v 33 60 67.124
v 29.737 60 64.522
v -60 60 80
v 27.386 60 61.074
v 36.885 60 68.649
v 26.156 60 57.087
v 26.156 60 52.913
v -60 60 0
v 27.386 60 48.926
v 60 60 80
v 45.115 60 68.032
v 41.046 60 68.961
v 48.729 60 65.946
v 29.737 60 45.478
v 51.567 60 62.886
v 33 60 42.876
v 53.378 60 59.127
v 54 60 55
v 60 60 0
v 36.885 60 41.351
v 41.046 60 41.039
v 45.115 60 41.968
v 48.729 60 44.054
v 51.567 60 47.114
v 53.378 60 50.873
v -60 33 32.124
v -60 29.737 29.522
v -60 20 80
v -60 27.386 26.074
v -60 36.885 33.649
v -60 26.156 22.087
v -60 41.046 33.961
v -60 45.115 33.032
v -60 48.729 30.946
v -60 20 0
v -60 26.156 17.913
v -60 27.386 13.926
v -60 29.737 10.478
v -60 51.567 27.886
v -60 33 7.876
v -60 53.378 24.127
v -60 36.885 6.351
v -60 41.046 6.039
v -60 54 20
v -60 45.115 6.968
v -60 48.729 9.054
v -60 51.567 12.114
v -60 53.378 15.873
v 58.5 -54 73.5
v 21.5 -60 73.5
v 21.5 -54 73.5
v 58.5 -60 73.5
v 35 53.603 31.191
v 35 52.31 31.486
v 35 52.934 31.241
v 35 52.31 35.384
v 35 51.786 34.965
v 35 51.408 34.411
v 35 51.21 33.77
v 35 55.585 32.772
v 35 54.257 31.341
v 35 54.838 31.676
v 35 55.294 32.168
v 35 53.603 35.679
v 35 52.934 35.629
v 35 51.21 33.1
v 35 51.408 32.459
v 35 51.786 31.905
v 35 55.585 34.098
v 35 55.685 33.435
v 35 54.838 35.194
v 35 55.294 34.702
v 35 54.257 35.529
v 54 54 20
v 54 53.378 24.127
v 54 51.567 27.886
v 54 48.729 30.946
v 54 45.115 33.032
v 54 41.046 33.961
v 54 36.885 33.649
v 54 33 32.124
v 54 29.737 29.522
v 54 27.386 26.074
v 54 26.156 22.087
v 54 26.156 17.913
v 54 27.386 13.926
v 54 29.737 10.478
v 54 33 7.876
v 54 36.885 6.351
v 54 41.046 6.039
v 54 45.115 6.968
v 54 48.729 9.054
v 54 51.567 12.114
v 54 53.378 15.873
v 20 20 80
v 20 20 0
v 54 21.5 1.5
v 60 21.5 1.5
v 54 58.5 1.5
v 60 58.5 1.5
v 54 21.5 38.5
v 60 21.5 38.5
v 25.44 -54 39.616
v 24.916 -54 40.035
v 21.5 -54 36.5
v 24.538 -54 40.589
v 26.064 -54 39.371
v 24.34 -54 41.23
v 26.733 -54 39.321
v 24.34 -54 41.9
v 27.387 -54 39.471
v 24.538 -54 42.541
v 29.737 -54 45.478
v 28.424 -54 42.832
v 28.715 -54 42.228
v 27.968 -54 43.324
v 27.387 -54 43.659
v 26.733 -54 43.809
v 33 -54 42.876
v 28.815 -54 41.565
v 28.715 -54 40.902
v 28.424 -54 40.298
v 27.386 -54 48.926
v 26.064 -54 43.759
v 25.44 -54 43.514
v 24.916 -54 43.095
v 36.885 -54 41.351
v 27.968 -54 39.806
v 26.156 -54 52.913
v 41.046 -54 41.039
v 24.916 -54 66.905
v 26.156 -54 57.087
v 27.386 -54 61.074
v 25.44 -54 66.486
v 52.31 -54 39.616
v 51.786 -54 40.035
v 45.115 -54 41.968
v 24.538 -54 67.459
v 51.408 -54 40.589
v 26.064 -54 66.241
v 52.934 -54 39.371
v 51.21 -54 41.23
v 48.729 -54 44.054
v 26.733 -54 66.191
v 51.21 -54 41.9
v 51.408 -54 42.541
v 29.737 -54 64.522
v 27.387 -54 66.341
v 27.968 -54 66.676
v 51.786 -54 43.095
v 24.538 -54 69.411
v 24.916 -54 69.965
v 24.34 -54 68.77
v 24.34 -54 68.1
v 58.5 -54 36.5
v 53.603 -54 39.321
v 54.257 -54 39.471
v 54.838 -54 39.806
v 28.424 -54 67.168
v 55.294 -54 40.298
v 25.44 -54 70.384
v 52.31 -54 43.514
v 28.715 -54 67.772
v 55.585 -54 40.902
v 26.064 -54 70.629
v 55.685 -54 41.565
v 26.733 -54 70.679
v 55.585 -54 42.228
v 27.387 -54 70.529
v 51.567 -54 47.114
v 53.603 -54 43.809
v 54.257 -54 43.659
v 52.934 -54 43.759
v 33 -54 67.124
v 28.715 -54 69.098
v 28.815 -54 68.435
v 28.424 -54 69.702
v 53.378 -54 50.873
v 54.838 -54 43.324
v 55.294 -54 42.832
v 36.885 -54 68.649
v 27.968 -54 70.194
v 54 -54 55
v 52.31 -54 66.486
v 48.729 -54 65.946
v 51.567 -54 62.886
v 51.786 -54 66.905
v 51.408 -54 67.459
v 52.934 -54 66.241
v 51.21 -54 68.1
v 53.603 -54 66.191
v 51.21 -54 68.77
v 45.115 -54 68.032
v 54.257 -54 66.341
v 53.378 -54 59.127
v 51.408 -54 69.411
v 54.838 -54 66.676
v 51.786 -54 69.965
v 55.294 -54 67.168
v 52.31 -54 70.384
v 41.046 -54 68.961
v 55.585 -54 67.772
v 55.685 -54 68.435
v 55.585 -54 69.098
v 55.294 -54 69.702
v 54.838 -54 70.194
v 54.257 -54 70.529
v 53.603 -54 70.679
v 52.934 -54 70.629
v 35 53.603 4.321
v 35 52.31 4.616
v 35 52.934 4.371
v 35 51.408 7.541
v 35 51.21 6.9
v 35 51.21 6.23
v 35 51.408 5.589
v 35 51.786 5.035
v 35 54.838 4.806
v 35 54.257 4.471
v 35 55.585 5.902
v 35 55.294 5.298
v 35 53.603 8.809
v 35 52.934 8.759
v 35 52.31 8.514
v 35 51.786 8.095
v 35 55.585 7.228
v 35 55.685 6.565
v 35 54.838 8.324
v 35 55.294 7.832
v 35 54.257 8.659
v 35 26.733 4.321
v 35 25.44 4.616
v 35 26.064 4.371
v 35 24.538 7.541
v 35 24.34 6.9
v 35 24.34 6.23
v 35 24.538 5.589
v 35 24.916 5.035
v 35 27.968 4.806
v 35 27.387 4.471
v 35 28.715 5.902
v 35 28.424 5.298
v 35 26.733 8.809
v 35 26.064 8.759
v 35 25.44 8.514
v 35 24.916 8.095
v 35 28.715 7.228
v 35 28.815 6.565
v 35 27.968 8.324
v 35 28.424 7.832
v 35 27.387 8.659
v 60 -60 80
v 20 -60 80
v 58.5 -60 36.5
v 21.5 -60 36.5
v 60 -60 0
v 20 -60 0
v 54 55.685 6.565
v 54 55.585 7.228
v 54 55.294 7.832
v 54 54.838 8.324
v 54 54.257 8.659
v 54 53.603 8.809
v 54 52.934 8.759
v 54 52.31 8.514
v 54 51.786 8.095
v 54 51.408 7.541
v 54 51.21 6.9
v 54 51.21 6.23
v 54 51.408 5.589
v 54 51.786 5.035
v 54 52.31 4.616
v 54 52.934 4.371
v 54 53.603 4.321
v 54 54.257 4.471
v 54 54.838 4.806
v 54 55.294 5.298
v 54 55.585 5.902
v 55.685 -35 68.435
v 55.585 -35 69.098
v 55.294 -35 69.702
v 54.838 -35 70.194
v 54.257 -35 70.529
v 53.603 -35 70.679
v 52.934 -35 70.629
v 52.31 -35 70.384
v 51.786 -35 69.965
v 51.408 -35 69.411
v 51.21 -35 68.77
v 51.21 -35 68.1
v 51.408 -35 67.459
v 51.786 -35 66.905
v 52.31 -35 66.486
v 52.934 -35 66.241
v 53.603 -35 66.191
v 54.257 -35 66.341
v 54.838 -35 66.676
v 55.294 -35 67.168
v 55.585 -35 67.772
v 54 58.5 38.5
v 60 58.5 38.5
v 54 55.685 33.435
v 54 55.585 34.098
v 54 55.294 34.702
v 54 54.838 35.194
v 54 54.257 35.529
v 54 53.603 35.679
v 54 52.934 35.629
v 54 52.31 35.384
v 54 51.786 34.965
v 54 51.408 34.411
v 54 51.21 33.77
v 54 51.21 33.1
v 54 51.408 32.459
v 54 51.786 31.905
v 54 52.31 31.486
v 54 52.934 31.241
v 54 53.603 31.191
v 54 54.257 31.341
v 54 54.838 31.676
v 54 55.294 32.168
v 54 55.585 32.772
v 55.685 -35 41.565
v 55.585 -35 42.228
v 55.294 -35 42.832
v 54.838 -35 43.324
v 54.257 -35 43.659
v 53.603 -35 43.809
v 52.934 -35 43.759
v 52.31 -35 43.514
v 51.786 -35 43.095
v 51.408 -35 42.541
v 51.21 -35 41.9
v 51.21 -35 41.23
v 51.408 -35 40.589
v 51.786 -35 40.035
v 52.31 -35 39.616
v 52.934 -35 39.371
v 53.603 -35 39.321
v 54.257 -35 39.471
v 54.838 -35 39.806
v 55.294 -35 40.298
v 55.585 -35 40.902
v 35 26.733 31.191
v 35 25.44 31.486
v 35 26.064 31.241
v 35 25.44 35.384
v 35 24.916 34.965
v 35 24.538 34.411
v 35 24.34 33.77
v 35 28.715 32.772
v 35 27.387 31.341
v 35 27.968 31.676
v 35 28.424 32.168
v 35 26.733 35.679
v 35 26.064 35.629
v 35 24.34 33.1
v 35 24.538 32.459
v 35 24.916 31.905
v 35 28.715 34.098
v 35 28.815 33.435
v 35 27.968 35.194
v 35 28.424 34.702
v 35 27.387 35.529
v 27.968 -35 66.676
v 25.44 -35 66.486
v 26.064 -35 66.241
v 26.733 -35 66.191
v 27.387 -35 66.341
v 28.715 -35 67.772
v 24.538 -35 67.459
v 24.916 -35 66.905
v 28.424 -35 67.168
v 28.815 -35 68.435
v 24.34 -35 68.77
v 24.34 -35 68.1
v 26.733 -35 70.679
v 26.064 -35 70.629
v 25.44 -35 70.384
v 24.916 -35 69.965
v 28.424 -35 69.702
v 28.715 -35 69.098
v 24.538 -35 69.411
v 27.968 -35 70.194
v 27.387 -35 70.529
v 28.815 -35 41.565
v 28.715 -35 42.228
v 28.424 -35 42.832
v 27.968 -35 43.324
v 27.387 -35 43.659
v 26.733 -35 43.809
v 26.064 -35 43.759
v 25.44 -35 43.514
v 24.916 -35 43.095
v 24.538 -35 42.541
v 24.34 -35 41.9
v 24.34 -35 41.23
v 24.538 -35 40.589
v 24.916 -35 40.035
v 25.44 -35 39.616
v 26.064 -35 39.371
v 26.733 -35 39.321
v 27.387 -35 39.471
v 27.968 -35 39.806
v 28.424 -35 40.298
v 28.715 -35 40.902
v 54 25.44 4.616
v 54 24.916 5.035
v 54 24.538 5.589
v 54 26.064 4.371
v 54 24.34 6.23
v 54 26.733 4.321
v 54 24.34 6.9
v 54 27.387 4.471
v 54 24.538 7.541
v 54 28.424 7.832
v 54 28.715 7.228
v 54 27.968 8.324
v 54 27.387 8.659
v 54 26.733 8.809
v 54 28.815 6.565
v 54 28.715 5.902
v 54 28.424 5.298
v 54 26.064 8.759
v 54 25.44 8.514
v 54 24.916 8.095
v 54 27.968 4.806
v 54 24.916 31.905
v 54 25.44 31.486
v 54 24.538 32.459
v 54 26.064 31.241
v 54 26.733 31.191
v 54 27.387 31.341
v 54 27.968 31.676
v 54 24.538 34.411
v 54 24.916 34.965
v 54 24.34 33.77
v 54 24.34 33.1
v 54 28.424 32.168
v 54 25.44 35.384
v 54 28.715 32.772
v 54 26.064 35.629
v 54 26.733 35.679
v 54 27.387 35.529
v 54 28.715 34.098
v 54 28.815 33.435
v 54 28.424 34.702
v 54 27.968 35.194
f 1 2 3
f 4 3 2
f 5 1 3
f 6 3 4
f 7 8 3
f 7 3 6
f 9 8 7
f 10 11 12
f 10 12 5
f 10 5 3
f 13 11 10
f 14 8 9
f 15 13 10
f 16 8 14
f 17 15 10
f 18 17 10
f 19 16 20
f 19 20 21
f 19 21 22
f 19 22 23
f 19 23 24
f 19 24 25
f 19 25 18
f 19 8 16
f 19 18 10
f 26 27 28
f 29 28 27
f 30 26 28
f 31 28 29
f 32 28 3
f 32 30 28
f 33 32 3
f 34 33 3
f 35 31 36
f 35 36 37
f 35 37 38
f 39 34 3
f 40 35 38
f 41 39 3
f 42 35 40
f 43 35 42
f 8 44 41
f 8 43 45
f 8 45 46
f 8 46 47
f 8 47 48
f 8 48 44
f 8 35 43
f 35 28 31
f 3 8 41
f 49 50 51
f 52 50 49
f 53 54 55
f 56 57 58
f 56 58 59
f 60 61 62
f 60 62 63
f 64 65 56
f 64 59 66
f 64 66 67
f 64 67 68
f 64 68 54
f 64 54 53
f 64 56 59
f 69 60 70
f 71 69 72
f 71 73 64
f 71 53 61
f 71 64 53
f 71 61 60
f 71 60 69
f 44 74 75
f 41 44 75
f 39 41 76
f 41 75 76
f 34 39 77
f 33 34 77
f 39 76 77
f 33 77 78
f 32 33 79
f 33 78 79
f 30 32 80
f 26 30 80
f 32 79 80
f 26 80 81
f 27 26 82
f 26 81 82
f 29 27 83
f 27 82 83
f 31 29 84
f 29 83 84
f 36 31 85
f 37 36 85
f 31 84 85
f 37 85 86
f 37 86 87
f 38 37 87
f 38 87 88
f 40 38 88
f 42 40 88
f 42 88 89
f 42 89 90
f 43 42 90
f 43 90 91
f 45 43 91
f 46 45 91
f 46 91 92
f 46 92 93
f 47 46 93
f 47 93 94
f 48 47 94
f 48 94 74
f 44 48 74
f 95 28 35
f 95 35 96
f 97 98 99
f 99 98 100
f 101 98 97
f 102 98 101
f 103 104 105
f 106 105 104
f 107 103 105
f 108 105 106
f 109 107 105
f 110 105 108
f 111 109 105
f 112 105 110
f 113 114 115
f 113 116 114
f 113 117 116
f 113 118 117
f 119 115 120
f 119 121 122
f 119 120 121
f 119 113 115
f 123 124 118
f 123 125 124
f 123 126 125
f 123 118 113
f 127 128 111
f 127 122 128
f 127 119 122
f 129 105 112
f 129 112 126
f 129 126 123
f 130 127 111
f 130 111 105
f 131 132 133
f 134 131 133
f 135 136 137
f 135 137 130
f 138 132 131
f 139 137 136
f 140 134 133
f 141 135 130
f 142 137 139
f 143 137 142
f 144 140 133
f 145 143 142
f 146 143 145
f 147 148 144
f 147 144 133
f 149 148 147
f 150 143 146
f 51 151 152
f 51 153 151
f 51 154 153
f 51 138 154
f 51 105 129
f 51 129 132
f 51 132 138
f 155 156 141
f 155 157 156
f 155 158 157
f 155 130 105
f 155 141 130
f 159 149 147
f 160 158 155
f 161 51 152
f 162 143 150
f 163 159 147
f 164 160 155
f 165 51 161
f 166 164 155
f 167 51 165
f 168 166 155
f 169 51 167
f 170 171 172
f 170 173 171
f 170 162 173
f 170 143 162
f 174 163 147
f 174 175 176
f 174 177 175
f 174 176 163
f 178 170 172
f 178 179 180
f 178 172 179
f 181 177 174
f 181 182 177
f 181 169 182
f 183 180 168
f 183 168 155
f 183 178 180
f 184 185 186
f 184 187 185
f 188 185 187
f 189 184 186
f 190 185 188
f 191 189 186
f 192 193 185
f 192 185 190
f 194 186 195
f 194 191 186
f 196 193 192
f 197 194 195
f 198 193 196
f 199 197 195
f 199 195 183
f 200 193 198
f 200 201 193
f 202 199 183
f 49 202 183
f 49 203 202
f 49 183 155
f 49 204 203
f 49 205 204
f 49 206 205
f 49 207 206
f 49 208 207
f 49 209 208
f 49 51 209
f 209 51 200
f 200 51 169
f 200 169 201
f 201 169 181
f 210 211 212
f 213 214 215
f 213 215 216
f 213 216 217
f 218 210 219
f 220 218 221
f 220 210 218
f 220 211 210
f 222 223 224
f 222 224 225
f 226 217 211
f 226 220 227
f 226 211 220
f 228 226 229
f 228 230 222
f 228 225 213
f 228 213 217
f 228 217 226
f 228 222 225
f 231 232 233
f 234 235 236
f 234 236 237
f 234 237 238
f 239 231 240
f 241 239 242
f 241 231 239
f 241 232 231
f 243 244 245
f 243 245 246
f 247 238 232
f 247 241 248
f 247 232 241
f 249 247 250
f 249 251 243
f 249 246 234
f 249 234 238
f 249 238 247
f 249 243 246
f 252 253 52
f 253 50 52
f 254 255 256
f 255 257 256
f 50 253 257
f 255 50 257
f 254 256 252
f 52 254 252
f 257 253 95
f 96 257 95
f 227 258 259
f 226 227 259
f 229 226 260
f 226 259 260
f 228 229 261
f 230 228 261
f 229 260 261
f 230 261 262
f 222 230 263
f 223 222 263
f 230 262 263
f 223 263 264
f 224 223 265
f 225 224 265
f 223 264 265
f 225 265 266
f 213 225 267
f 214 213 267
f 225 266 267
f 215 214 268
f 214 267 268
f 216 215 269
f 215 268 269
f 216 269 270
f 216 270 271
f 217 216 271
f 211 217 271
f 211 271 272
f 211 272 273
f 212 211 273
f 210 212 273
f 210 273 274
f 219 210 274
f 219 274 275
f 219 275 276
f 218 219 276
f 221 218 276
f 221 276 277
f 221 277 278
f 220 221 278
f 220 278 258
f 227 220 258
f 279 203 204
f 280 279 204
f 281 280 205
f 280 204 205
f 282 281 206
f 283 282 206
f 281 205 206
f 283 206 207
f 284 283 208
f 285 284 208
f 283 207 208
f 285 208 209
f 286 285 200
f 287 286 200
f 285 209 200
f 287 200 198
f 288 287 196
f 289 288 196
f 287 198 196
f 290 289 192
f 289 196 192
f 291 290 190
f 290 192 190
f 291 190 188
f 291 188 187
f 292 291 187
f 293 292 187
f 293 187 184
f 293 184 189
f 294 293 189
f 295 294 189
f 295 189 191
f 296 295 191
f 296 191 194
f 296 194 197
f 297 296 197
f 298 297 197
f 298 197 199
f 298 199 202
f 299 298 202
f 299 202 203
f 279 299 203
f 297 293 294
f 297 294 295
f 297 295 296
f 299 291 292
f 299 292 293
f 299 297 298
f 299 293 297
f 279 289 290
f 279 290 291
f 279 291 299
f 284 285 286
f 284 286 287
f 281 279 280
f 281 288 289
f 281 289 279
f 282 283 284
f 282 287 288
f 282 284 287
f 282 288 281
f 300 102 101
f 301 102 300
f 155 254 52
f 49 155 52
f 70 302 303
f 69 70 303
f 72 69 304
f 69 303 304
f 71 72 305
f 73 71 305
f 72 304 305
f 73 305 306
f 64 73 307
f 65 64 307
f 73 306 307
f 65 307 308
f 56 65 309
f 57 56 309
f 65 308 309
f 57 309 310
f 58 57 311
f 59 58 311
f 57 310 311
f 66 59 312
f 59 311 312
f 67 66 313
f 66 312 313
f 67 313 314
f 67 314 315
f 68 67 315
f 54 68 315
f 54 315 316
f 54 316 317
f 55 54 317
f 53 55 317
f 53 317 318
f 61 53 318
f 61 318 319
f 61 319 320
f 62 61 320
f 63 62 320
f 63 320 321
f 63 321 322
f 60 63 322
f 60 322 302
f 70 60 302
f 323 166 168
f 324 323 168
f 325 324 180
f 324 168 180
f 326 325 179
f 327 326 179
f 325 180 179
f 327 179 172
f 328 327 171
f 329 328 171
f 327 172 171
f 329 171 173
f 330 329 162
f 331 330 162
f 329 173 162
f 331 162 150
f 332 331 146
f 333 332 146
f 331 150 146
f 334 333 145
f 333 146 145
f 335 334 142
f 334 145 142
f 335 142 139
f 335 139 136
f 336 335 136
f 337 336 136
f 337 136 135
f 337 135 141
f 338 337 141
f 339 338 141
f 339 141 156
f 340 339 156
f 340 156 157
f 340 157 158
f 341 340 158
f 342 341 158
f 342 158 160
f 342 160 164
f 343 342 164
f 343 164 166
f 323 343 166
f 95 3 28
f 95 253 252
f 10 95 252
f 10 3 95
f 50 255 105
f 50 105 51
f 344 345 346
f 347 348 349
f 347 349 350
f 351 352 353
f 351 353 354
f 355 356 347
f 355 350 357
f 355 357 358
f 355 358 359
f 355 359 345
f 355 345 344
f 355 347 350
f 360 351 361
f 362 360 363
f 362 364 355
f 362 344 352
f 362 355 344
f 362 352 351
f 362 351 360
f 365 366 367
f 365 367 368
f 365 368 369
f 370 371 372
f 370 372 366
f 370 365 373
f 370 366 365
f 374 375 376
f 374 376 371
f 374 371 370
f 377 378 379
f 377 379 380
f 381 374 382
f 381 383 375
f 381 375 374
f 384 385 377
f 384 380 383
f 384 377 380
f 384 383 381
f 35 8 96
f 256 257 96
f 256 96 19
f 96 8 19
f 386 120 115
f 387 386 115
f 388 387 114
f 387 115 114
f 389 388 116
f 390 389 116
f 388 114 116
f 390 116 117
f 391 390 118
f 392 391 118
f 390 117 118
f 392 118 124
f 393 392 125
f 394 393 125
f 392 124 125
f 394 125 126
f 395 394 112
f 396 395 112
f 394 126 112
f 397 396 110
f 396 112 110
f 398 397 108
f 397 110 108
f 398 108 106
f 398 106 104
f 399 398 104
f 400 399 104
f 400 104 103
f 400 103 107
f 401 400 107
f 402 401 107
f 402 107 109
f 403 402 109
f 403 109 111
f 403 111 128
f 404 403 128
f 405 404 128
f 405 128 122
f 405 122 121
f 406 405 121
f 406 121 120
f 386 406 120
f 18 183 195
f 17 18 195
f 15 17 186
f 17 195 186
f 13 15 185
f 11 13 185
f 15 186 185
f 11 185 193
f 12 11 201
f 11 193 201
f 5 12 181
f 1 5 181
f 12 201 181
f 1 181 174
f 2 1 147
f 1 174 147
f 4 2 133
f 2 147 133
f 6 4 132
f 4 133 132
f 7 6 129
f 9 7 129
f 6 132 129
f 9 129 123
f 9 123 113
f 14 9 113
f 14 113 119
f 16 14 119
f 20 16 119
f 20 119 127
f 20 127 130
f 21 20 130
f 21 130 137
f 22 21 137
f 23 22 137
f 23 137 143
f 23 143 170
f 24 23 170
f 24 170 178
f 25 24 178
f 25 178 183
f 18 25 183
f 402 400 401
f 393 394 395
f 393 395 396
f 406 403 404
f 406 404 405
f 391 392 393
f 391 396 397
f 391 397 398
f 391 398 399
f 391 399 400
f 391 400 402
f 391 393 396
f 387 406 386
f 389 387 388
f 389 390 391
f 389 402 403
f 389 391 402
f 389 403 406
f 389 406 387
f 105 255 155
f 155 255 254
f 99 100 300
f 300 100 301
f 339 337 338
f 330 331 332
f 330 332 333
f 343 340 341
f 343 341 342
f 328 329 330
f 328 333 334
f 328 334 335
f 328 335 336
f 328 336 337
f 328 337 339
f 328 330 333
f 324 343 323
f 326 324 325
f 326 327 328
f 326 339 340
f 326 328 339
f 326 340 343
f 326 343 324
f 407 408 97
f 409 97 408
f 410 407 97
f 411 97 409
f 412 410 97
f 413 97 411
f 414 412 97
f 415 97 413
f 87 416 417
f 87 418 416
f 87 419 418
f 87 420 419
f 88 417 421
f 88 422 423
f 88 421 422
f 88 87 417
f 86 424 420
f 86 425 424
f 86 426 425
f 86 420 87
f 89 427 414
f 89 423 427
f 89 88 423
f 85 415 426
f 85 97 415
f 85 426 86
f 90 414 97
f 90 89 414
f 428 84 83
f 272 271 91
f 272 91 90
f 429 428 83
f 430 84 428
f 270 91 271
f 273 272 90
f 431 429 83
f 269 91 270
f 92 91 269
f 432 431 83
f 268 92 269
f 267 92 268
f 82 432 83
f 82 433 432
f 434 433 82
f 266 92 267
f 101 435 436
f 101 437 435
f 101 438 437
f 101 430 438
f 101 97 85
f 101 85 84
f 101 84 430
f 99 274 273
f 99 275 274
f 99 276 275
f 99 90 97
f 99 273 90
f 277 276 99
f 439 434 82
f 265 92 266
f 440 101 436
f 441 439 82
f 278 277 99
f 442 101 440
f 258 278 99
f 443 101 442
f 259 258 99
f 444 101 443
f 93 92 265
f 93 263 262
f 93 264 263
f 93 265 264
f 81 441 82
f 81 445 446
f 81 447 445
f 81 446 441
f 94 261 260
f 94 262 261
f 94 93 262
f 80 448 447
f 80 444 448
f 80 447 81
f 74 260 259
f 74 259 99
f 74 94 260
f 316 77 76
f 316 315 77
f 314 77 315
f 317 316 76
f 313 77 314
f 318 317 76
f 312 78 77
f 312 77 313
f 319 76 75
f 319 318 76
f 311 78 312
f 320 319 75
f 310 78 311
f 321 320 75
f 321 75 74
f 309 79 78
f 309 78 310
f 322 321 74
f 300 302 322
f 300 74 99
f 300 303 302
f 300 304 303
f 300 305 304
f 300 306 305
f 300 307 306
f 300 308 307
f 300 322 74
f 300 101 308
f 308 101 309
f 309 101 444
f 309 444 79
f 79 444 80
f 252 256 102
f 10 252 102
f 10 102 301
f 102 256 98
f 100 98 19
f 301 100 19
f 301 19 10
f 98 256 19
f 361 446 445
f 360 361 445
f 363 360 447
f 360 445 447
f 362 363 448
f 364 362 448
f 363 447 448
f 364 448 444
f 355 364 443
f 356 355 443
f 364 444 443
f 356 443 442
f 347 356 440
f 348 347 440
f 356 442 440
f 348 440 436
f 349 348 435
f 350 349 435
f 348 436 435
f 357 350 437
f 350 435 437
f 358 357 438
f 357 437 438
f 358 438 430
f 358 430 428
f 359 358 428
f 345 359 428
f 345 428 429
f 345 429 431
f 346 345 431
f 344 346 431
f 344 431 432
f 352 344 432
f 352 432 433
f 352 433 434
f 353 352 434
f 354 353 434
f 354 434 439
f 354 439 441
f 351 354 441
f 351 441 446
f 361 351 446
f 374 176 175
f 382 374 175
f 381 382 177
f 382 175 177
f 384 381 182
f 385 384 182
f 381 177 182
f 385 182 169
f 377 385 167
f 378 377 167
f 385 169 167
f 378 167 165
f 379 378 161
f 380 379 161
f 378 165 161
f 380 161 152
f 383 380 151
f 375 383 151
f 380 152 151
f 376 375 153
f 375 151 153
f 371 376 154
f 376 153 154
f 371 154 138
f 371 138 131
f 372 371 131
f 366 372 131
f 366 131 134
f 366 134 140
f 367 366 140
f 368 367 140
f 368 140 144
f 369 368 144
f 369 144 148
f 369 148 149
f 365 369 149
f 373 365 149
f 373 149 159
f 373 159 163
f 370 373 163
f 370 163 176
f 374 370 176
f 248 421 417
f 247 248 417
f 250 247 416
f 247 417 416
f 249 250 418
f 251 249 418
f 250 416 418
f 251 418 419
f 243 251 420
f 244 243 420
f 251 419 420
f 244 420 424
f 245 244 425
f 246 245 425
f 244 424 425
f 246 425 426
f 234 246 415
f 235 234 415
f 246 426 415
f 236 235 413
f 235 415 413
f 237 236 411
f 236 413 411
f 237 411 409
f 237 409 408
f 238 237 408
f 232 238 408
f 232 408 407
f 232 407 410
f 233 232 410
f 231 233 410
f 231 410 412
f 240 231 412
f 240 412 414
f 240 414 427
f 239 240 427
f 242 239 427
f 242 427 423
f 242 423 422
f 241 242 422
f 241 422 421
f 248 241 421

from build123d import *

# Parameters (mm, degrees)
F0_W      = 120
F0_H      = 120
F1_DEPTH  = 80
F2_W      = 37
F2_H      = 37
F2_R      = 2.25
F2_R_2    = 14
F3_DEPTH  = 6
F4_DEPTH  = 120.001
F5_DEPTH  = 25
F6_W      = 37
F6_H      = 37
F6_R      = 2.25
F6_R_2    = 14
F7_DEPTH  = 6
F8_DEPTH  = 120.001
F9_DEPTH  = 25
F10_W     = 80
F10_H     = 80
F11_DEPTH = 80.001


with BuildPart() as f1:
    # F0 (on Top) → F1 (new body)
    with BuildSketch(Plane.XY):
        Rectangle(F0_W, F0_H)
    extrude(amount=F1_DEPTH)

    # F2 (on face) → F3 (cut)
    with BuildSketch(Plane.XZ.offset(60)):
        with Locations((40, 55)):
            Rectangle(F2_W, F2_H)
        with Locations((26.564971, 41.564971)):
            Circle(F2_R, mode=Mode.SUBTRACT)
        with Locations((53.435029, 41.564971)):
            Circle(F2_R, mode=Mode.SUBTRACT)
        with Locations((26.564971, 68.435029)):
            Circle(F2_R, mode=Mode.SUBTRACT)
        with Locations((40, 55)):
            Circle(F2_R_2, mode=Mode.SUBTRACT)
        with Locations((53.435029, 68.435029)):
            Circle(F2_R, mode=Mode.SUBTRACT)
        with Locations((26.564971, 68.435029)):
            Circle(F2_R)
        with Locations((40, 55)):
            Circle(F2_R_2)
        with Locations((53.435029, 68.435029)):
            Circle(F2_R)
        with Locations((53.435029, 41.564971)):
            Circle(F2_R)
        with Locations((26.564971, 41.564971)):
            Circle(F2_R)
    extrude(amount=-F3_DEPTH, mode=Mode.SUBTRACT)

    # F2 (on face) → F4 (cut, through all)
    with BuildSketch(Plane.XZ.offset(60)):
        with Locations((40, 55)):
            Circle(F2_R_2)
    extrude(amount=-F4_DEPTH, mode=Mode.SUBTRACT)

    # F2 (on face) → F5 (cut)
    with BuildSketch(Plane.XZ.offset(60)):
        with Locations((26.564971, 68.435029)):
            Circle(F2_R)
        with Locations((53.435029, 68.435029)):
            Circle(F2_R)
        with Locations((53.435029, 41.564971)):
            Circle(F2_R)
        with Locations((26.564971, 41.564971)):
            Circle(F2_R)
    extrude(amount=-F5_DEPTH, mode=Mode.SUBTRACT)

    # F6 (on face) → F7 (cut)
    with BuildSketch(Plane.YZ.offset(60)):
        with Locations((40, 20)):
            Rectangle(F6_W, F6_H)
        with Locations((26.564971, 6.564971)):
            Circle(F6_R, mode=Mode.SUBTRACT)
        with Locations((53.435029, 6.564971)):
            Circle(F6_R, mode=Mode.SUBTRACT)
        with Locations((26.564971, 33.435029)):
            Circle(F6_R, mode=Mode.SUBTRACT)
        with Locations((40, 20)):
            Circle(F6_R_2, mode=Mode.SUBTRACT)
        with Locations((53.435029, 33.435029)):
            Circle(F6_R, mode=Mode.SUBTRACT)
        with Locations((40, 20)):
            Circle(F6_R_2)
        with Locations((26.564971, 33.435029)):
            Circle(F6_R)
        with Locations((53.435029, 33.435029)):
            Circle(F6_R)
        with Locations((53.435029, 6.564971)):
            Circle(F6_R)
        with Locations((26.564971, 6.564971)):
            Circle(F6_R)
    extrude(amount=-F7_DEPTH, mode=Mode.SUBTRACT)

    # F6 (on face) → F8 (cut, through all)
    with BuildSketch(Plane.YZ.offset(60)):
        with Locations((40, 20)):
            Circle(F6_R_2)
    extrude(amount=-F8_DEPTH, mode=Mode.SUBTRACT)

    # F6 (on face) → F9 (cut)
    with BuildSketch(Plane.YZ.offset(60)):
        with Locations((26.564971, 33.435029)):
            Circle(F6_R)
        with Locations((53.435029, 33.435029)):
            Circle(F6_R)
        with Locations((53.435029, 6.564971)):
            Circle(F6_R)
        with Locations((26.564971, 6.564971)):
            Circle(F6_R)
    extrude(amount=-F9_DEPTH, mode=Mode.SUBTRACT)

    # F10 (on face) → F11 (cut, through all)
    with BuildSketch(Plane.XY.offset(80)):
        with Locations((-20, -20)):
            Rectangle(F10_W, F10_H)
    extrude(amount=-F11_DEPTH, mode=Mode.SUBTRACT)


solid = f1.part
